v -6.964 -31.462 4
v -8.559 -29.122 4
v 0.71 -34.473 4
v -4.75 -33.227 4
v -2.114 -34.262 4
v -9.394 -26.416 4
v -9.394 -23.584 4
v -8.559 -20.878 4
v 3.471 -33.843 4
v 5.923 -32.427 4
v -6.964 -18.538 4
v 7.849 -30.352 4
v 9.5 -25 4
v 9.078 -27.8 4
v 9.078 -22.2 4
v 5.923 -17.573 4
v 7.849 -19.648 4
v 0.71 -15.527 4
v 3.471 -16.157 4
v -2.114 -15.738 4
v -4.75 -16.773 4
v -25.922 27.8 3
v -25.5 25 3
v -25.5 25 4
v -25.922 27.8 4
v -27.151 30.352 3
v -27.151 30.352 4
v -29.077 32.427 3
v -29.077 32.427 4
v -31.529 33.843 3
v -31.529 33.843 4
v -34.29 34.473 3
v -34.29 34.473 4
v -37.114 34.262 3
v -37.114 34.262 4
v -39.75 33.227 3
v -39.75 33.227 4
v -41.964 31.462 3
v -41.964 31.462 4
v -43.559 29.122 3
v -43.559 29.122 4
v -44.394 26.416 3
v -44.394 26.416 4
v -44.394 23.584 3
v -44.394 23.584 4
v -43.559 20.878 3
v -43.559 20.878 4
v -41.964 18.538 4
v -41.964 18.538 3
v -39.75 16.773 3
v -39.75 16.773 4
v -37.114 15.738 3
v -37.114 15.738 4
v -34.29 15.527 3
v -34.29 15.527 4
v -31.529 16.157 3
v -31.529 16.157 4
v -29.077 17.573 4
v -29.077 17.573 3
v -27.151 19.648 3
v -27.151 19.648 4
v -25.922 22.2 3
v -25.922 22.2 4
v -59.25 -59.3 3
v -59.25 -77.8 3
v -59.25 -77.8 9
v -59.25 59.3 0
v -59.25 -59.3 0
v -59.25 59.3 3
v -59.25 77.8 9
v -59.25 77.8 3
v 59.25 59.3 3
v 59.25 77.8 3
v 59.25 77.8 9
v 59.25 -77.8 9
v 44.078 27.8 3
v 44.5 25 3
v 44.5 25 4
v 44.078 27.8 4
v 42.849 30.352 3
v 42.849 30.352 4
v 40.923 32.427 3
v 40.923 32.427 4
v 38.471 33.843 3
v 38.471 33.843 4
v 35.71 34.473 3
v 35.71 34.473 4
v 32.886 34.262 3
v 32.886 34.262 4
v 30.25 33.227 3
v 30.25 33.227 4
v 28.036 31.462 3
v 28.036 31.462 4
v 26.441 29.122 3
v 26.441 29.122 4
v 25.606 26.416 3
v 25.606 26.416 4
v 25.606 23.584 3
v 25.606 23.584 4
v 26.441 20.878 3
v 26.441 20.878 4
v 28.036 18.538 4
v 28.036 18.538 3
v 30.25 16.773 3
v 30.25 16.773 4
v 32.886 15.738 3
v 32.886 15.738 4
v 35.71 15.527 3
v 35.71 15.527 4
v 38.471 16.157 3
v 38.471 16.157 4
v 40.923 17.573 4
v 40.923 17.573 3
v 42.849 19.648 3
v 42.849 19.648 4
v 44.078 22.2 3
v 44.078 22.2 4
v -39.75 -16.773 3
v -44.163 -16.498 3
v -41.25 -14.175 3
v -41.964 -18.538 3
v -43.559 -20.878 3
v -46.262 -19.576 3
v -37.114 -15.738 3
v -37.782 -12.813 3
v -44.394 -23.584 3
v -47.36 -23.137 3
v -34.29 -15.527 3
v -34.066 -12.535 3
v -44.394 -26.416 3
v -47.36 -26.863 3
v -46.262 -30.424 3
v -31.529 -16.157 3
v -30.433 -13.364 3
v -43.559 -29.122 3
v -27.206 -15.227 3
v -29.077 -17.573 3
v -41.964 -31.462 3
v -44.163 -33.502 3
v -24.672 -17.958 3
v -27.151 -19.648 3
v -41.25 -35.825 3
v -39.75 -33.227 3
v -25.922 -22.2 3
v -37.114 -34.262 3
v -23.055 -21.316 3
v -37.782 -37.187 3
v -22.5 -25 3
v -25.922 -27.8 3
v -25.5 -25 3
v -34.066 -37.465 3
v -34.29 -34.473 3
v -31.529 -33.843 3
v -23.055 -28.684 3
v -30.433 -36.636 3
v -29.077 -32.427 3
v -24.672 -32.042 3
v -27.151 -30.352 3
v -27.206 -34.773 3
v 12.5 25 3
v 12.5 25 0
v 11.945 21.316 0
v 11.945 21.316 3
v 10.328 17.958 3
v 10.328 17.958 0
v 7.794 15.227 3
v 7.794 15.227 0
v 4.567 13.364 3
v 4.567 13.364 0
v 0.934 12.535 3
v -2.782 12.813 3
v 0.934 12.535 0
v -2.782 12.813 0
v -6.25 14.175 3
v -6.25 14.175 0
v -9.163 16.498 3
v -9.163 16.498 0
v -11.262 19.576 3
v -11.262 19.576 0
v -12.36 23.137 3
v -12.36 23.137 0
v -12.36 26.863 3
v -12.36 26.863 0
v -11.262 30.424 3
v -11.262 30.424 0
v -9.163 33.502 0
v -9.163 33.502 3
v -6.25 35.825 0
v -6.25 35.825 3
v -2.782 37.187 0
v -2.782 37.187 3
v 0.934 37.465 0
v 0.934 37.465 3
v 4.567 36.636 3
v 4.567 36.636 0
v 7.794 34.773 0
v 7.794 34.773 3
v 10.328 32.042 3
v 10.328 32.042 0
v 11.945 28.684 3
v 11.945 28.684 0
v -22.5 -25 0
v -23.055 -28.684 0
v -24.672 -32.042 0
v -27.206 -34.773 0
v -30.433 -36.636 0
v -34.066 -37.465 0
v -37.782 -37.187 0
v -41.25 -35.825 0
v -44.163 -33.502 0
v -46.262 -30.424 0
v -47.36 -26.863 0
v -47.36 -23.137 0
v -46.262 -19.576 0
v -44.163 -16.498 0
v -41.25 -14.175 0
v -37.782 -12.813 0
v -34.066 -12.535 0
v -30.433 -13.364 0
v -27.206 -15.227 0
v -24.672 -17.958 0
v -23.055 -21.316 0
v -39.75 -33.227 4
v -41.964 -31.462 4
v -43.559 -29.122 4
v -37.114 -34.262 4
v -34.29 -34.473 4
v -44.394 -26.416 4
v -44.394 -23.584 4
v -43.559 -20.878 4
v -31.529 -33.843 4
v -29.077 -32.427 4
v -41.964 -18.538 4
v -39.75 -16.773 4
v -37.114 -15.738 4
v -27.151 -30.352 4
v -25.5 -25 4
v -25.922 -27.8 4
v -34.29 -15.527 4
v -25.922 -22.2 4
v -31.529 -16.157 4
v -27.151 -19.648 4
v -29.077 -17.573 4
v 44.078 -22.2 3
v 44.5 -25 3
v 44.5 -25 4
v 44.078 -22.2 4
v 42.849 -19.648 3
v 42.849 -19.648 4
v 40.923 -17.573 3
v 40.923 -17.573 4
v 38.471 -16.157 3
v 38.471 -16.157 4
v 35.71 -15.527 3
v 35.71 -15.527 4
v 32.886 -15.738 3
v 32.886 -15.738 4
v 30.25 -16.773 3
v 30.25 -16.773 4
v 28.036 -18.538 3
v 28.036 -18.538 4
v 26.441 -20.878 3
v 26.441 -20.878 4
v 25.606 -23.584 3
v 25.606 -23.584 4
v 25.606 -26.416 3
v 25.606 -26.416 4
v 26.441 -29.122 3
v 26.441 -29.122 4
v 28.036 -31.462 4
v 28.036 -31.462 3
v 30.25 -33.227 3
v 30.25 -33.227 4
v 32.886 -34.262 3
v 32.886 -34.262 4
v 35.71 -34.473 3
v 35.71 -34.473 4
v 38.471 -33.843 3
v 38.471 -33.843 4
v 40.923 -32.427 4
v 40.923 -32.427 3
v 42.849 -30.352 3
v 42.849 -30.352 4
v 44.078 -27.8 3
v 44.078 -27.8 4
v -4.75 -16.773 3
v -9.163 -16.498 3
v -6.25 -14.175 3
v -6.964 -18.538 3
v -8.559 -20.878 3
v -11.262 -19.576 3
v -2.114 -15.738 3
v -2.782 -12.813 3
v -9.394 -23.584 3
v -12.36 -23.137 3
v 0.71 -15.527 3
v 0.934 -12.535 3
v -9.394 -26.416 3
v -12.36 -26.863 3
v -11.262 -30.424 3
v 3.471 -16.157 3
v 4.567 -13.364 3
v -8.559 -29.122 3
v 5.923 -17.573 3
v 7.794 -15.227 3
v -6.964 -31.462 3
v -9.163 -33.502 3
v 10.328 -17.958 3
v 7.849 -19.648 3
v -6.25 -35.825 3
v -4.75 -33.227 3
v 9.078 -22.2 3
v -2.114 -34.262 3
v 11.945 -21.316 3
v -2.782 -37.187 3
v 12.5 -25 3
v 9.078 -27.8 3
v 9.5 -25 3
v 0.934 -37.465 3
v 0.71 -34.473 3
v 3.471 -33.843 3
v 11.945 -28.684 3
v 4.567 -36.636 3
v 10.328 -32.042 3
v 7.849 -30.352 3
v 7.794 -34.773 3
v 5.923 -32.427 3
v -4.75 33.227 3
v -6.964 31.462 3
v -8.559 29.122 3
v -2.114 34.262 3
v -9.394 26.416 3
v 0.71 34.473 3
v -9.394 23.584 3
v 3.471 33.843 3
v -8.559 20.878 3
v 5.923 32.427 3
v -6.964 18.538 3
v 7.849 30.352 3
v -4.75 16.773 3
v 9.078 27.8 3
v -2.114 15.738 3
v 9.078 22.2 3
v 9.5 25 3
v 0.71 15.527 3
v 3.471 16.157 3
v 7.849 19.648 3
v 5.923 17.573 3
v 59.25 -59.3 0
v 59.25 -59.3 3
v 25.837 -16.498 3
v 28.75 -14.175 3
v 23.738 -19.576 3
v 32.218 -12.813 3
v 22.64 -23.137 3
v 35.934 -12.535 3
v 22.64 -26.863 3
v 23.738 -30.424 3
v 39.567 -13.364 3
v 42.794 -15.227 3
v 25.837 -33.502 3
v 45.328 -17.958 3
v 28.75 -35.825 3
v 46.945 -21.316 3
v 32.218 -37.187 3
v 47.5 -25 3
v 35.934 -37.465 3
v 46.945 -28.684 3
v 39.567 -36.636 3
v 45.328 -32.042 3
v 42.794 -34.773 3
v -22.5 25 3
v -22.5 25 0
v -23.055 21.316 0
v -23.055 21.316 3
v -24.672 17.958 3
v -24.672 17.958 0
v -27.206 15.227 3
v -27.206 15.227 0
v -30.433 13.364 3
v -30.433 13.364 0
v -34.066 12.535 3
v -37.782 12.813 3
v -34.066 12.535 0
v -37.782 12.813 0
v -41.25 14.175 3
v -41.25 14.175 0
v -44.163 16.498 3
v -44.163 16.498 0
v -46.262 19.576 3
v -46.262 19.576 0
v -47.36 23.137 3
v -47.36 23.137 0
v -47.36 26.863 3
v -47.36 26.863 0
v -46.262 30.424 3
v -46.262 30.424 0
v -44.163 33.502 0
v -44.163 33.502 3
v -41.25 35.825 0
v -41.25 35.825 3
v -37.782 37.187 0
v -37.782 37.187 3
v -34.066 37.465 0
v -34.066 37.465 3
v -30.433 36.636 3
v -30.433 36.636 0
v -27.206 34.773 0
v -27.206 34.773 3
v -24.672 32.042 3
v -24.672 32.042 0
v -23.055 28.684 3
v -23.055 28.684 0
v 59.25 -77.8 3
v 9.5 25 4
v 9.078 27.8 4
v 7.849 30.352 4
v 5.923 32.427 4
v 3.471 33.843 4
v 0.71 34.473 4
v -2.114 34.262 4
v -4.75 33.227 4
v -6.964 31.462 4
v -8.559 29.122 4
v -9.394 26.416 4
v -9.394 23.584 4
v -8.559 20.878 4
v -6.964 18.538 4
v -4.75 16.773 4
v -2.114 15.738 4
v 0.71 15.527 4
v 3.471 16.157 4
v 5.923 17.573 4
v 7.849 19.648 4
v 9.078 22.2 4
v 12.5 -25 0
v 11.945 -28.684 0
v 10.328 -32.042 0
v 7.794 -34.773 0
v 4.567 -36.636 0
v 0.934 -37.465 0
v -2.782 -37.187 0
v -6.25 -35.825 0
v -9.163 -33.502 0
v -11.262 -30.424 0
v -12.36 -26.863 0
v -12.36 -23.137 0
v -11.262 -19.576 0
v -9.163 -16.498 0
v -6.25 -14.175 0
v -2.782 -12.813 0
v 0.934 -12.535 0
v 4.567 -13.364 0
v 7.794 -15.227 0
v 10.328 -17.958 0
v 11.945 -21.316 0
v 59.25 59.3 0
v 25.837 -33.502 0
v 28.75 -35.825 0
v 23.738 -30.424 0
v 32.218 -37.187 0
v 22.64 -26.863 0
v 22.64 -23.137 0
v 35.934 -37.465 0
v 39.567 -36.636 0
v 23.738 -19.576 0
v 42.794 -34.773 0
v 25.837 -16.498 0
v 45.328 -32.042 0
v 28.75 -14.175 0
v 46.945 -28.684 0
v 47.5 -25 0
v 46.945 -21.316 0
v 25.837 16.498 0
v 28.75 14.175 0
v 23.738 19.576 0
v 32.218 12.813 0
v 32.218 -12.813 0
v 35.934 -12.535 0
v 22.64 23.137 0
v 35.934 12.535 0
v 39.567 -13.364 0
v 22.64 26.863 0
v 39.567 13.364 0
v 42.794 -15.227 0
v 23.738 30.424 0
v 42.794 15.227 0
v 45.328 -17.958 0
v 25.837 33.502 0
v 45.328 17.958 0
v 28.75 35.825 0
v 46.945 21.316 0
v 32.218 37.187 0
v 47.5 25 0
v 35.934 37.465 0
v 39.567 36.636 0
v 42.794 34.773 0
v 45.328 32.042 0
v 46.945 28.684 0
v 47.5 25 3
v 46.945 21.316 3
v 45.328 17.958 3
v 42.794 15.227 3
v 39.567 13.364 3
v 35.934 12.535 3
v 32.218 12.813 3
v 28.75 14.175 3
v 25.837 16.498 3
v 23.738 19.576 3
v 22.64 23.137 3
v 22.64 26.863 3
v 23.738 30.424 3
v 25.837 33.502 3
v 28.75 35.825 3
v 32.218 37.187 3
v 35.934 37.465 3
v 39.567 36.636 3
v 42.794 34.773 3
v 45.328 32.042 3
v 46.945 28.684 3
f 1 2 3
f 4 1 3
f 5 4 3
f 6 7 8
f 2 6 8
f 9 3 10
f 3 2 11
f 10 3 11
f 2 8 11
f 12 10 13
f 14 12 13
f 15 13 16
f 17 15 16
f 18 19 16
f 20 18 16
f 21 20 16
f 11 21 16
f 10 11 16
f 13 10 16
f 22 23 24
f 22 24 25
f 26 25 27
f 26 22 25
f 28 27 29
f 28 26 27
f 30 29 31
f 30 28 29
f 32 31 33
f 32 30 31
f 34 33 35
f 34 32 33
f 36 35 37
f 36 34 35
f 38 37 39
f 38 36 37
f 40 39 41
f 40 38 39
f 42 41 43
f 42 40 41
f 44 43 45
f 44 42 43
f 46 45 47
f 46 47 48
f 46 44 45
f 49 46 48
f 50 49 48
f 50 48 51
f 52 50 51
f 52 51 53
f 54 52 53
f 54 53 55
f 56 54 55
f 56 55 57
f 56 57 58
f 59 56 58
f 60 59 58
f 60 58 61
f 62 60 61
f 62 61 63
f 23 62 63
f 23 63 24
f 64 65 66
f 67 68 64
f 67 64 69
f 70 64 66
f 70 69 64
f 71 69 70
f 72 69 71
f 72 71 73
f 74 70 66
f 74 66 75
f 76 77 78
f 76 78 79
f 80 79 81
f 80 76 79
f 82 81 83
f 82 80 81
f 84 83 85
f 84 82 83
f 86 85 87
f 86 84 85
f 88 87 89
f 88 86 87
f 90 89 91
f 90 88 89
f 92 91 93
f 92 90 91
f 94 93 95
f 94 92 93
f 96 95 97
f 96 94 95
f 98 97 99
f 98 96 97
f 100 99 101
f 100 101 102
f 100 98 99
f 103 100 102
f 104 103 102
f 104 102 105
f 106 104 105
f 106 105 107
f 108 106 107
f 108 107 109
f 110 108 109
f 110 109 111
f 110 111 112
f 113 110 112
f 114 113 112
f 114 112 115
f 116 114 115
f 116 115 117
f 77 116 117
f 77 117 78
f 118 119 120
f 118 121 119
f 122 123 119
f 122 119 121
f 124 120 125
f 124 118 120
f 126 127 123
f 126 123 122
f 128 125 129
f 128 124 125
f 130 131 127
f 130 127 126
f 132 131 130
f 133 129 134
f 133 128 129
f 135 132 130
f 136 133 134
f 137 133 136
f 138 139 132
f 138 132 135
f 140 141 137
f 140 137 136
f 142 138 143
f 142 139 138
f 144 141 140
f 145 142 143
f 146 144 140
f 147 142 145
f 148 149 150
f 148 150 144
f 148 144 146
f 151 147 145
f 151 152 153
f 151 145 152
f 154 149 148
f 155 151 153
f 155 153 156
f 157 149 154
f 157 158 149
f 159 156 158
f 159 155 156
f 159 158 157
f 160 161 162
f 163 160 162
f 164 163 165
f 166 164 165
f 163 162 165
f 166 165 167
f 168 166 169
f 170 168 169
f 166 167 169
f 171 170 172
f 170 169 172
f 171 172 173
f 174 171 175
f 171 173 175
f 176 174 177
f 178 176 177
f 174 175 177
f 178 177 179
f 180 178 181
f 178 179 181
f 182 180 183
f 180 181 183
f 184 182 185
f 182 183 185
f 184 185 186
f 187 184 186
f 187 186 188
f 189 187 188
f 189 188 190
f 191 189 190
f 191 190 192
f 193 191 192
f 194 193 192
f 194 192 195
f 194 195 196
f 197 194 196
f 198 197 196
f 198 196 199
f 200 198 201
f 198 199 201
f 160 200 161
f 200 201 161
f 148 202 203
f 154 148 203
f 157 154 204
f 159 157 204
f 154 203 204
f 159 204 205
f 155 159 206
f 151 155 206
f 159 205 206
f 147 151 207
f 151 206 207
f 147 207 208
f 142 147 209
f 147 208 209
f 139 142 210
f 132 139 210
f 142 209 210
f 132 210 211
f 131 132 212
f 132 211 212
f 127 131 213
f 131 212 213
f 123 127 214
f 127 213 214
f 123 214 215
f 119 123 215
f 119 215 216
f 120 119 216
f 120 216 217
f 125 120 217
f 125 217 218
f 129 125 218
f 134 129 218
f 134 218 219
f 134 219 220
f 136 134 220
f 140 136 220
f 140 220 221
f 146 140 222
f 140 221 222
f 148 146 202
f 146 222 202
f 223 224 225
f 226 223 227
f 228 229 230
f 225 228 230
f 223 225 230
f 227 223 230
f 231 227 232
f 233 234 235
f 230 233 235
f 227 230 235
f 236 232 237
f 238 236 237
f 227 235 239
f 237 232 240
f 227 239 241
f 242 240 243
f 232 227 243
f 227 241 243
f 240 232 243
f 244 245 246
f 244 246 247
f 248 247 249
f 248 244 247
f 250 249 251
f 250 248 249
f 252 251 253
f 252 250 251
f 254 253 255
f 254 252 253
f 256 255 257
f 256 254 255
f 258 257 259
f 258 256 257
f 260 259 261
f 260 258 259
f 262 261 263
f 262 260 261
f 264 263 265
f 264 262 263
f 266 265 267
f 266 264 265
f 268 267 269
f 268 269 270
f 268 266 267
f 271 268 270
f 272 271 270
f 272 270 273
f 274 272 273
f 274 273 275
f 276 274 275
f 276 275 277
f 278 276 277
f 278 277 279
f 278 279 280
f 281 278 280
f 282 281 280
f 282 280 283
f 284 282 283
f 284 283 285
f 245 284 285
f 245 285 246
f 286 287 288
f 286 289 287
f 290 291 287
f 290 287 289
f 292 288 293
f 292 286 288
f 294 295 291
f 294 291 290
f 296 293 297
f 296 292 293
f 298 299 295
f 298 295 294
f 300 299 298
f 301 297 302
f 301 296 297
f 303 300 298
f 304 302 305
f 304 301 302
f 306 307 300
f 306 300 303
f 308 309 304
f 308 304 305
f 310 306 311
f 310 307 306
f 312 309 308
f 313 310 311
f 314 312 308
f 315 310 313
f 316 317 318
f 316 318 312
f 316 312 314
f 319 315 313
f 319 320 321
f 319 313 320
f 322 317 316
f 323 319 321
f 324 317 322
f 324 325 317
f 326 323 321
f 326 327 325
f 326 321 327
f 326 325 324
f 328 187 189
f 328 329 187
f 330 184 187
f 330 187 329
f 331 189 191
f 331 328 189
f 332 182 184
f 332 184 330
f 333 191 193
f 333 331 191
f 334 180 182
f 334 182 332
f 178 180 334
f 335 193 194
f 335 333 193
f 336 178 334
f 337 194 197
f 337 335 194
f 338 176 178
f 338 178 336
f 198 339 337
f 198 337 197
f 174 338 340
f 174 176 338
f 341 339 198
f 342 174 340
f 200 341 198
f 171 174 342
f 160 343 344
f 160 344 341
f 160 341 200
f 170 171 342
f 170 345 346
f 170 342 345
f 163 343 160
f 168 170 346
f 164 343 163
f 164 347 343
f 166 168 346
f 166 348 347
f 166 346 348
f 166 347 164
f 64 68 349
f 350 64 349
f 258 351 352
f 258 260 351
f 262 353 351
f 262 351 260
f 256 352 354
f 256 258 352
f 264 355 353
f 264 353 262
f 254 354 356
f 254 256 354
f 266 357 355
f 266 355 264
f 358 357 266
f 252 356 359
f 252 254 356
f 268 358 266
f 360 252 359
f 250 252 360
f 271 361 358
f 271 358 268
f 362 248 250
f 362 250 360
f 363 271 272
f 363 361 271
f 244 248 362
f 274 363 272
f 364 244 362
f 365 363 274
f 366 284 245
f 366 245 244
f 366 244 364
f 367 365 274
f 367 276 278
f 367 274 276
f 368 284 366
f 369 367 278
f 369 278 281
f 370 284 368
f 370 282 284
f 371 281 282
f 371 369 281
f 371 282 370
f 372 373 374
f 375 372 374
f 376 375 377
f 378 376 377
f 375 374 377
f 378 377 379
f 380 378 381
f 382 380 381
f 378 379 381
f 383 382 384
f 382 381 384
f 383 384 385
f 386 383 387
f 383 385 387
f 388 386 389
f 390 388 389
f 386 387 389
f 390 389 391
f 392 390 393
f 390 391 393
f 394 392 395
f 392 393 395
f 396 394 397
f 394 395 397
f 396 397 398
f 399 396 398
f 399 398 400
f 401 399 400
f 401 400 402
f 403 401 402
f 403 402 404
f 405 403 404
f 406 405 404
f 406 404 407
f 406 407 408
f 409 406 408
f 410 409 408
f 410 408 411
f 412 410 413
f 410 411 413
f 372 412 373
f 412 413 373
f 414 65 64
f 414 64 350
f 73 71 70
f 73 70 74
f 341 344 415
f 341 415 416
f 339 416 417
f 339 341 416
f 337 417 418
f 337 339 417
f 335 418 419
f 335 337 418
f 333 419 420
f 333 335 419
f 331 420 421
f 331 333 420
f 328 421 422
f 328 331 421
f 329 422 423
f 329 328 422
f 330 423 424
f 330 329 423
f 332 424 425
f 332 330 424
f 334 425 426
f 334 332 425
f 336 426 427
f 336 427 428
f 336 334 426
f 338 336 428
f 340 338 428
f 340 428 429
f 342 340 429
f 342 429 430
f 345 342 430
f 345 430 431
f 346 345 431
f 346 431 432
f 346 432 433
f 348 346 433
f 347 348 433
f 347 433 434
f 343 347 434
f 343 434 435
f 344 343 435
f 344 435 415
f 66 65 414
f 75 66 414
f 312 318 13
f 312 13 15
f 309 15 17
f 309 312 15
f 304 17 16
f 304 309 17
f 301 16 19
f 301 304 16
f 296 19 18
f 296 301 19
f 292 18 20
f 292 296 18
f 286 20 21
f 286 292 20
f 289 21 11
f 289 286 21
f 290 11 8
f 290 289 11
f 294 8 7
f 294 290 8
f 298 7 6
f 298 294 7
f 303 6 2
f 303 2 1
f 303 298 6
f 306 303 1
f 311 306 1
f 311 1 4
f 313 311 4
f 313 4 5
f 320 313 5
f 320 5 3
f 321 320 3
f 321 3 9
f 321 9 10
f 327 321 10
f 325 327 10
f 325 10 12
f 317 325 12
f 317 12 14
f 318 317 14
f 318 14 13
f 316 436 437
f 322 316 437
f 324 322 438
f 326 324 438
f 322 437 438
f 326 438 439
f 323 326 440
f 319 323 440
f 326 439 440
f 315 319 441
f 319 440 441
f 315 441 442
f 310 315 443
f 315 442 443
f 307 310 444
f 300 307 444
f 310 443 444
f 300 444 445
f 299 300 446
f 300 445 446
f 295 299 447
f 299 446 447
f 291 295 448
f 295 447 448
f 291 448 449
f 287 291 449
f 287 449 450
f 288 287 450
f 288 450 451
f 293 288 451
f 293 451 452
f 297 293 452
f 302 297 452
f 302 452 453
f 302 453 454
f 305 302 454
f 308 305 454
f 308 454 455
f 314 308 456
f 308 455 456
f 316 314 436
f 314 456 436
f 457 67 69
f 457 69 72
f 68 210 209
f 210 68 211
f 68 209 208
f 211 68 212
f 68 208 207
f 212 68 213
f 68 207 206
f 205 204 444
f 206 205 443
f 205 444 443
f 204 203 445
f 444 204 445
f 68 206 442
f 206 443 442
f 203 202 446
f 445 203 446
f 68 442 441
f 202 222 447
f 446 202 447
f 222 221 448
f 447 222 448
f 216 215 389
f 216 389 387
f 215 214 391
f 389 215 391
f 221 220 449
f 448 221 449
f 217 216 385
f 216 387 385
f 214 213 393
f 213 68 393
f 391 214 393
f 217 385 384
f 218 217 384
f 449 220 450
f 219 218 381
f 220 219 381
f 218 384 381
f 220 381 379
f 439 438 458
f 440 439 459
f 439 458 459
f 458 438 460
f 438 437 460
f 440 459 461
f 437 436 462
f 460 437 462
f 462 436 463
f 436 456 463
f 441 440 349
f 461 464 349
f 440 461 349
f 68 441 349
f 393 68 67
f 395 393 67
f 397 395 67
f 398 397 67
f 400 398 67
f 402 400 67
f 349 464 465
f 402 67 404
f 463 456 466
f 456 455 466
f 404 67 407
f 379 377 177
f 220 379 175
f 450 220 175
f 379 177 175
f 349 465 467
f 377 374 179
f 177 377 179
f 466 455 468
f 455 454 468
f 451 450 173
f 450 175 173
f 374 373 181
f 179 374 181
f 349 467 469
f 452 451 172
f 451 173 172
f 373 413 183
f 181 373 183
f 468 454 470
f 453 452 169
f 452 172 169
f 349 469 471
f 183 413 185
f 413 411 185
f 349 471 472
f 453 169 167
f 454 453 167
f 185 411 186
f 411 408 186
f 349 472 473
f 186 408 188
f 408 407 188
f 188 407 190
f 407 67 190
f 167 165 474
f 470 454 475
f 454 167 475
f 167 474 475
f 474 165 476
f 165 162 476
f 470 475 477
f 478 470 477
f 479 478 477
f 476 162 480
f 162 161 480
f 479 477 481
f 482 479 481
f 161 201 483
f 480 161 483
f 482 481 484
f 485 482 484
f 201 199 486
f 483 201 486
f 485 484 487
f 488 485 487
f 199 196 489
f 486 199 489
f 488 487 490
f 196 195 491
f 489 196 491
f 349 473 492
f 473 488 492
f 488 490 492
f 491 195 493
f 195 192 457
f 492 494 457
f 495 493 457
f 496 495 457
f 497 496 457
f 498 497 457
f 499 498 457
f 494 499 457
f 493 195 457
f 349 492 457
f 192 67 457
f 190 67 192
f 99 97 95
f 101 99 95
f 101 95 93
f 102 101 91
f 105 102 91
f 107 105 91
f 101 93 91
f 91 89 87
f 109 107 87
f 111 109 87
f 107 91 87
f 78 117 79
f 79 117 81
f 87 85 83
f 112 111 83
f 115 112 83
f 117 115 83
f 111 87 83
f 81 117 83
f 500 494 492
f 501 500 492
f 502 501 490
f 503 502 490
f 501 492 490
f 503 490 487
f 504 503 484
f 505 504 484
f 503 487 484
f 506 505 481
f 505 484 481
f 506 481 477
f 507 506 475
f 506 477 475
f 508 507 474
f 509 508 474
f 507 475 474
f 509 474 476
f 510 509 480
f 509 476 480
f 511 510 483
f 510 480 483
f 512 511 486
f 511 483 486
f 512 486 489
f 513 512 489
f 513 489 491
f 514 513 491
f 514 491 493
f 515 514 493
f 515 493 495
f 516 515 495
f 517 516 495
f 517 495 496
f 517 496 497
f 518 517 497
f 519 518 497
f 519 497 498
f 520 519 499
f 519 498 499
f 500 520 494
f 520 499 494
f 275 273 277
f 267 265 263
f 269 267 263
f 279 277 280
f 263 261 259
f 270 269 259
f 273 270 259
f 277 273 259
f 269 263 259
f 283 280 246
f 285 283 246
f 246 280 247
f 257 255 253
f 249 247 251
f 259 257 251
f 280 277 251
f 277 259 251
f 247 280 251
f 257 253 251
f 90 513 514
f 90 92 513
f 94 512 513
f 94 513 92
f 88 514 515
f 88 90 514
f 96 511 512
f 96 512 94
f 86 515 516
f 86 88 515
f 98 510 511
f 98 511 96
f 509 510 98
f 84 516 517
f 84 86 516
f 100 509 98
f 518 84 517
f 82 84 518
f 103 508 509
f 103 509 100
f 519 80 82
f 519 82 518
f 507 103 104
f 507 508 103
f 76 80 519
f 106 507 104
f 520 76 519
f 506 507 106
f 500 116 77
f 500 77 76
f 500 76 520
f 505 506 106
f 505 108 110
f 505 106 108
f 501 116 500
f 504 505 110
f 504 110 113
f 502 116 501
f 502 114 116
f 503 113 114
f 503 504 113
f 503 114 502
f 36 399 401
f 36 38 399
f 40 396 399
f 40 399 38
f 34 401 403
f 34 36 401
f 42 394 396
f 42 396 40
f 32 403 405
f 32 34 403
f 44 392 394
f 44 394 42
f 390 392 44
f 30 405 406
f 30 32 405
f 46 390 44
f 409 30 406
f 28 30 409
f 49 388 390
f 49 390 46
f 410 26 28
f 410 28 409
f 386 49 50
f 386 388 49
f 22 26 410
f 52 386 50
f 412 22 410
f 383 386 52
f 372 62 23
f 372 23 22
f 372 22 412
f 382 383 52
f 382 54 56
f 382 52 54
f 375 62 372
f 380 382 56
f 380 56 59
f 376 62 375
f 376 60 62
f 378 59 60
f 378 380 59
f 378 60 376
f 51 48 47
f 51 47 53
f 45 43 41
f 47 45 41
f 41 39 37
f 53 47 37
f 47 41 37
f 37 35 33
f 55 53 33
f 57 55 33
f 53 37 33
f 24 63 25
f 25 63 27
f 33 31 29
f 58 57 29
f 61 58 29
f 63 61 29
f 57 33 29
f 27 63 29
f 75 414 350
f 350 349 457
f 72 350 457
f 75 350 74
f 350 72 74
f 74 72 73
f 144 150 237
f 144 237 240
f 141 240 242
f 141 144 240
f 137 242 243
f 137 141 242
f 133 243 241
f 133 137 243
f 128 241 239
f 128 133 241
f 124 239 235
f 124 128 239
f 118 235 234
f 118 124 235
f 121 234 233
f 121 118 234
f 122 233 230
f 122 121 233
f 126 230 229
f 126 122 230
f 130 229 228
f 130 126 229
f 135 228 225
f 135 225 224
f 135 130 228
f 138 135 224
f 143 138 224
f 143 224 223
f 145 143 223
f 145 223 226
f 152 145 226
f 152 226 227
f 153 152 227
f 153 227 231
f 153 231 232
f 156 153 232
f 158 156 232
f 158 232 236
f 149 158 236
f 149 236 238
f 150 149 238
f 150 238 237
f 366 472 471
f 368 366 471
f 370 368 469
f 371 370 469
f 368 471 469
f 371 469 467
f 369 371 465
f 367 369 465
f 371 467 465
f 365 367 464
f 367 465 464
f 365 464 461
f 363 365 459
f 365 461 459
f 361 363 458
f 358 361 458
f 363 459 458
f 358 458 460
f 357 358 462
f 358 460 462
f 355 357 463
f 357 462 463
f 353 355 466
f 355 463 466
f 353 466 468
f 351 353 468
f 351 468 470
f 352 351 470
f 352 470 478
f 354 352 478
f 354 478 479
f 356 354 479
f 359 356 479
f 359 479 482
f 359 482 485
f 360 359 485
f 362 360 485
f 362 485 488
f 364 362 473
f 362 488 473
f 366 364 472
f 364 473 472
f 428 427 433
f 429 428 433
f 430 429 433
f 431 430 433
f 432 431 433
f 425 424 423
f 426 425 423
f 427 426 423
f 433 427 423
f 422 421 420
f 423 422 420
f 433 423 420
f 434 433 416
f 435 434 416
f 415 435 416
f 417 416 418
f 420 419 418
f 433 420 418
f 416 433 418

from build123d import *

# Parameters (mm, degrees)
F0_W     = 118.5
F0_H     = 155.6
F0_R     = 9.5
F1_DEPTH = 4
F2_W     = 118.5
F2_H     = 155.6
F3_DEPTH = 5
F4_R     = 12.5
F4_W     = 118.5
F4_H     = 18.5
F5_DEPTH = 3


with BuildPart() as f1:
    # F0 (on Top) → F1 (new body)
    with BuildSketch(Plane.XY):
        Rectangle(F0_W, F0_H)
        with Locations((-35, -25)):
            Circle(F0_R, mode=Mode.SUBTRACT)
        with Locations((0, -25)):
            Circle(F0_R, mode=Mode.SUBTRACT)
        with Locations((35, -25)):
            Circle(F0_R, mode=Mode.SUBTRACT)
        with Locations((-35, 25)):
            Circle(F0_R, mode=Mode.SUBTRACT)
        with Locations((0, 25)):
            Circle(F0_R, mode=Mode.SUBTRACT)
        with Locations((35, 25)):
            Circle(F0_R, mode=Mode.SUBTRACT)
    extrude(amount=F1_DEPTH)

    # F2 (on face) → F3 (join)
    with BuildSketch(Plane.XY.offset(4)):
        Rectangle(F2_W, F2_H)
    extrude(amount=F3_DEPTH)

    # F4 (on face) → F5 (cut)
    with BuildSketch(Plane(origin=(0, 0, 0), x_dir=(1, 0, 0), z_dir=(0, 0, -1))):
        with Locations((-35, 25)):
            Circle(F4_R)
        with Locations((-35, -25)):
            Circle(F4_R)
        with Locations((0, 25)):
            Circle(F4_R)
        with Locations((0, -25)):
            Circle(F4_R)
        with Locations((35, 25)):
            Circle(F4_R)
        with Locations((35, -25)):
            Circle(F4_R)
        with Locations((0, 68.55)):
            Rectangle(F4_W, F4_H)
        with Locations((0, -68.55)):
            Rectangle(F4_W, F4_H)
    extrude(amount=-F5_DEPTH, mode=Mode.SUBTRACT)


solid = f1.part
